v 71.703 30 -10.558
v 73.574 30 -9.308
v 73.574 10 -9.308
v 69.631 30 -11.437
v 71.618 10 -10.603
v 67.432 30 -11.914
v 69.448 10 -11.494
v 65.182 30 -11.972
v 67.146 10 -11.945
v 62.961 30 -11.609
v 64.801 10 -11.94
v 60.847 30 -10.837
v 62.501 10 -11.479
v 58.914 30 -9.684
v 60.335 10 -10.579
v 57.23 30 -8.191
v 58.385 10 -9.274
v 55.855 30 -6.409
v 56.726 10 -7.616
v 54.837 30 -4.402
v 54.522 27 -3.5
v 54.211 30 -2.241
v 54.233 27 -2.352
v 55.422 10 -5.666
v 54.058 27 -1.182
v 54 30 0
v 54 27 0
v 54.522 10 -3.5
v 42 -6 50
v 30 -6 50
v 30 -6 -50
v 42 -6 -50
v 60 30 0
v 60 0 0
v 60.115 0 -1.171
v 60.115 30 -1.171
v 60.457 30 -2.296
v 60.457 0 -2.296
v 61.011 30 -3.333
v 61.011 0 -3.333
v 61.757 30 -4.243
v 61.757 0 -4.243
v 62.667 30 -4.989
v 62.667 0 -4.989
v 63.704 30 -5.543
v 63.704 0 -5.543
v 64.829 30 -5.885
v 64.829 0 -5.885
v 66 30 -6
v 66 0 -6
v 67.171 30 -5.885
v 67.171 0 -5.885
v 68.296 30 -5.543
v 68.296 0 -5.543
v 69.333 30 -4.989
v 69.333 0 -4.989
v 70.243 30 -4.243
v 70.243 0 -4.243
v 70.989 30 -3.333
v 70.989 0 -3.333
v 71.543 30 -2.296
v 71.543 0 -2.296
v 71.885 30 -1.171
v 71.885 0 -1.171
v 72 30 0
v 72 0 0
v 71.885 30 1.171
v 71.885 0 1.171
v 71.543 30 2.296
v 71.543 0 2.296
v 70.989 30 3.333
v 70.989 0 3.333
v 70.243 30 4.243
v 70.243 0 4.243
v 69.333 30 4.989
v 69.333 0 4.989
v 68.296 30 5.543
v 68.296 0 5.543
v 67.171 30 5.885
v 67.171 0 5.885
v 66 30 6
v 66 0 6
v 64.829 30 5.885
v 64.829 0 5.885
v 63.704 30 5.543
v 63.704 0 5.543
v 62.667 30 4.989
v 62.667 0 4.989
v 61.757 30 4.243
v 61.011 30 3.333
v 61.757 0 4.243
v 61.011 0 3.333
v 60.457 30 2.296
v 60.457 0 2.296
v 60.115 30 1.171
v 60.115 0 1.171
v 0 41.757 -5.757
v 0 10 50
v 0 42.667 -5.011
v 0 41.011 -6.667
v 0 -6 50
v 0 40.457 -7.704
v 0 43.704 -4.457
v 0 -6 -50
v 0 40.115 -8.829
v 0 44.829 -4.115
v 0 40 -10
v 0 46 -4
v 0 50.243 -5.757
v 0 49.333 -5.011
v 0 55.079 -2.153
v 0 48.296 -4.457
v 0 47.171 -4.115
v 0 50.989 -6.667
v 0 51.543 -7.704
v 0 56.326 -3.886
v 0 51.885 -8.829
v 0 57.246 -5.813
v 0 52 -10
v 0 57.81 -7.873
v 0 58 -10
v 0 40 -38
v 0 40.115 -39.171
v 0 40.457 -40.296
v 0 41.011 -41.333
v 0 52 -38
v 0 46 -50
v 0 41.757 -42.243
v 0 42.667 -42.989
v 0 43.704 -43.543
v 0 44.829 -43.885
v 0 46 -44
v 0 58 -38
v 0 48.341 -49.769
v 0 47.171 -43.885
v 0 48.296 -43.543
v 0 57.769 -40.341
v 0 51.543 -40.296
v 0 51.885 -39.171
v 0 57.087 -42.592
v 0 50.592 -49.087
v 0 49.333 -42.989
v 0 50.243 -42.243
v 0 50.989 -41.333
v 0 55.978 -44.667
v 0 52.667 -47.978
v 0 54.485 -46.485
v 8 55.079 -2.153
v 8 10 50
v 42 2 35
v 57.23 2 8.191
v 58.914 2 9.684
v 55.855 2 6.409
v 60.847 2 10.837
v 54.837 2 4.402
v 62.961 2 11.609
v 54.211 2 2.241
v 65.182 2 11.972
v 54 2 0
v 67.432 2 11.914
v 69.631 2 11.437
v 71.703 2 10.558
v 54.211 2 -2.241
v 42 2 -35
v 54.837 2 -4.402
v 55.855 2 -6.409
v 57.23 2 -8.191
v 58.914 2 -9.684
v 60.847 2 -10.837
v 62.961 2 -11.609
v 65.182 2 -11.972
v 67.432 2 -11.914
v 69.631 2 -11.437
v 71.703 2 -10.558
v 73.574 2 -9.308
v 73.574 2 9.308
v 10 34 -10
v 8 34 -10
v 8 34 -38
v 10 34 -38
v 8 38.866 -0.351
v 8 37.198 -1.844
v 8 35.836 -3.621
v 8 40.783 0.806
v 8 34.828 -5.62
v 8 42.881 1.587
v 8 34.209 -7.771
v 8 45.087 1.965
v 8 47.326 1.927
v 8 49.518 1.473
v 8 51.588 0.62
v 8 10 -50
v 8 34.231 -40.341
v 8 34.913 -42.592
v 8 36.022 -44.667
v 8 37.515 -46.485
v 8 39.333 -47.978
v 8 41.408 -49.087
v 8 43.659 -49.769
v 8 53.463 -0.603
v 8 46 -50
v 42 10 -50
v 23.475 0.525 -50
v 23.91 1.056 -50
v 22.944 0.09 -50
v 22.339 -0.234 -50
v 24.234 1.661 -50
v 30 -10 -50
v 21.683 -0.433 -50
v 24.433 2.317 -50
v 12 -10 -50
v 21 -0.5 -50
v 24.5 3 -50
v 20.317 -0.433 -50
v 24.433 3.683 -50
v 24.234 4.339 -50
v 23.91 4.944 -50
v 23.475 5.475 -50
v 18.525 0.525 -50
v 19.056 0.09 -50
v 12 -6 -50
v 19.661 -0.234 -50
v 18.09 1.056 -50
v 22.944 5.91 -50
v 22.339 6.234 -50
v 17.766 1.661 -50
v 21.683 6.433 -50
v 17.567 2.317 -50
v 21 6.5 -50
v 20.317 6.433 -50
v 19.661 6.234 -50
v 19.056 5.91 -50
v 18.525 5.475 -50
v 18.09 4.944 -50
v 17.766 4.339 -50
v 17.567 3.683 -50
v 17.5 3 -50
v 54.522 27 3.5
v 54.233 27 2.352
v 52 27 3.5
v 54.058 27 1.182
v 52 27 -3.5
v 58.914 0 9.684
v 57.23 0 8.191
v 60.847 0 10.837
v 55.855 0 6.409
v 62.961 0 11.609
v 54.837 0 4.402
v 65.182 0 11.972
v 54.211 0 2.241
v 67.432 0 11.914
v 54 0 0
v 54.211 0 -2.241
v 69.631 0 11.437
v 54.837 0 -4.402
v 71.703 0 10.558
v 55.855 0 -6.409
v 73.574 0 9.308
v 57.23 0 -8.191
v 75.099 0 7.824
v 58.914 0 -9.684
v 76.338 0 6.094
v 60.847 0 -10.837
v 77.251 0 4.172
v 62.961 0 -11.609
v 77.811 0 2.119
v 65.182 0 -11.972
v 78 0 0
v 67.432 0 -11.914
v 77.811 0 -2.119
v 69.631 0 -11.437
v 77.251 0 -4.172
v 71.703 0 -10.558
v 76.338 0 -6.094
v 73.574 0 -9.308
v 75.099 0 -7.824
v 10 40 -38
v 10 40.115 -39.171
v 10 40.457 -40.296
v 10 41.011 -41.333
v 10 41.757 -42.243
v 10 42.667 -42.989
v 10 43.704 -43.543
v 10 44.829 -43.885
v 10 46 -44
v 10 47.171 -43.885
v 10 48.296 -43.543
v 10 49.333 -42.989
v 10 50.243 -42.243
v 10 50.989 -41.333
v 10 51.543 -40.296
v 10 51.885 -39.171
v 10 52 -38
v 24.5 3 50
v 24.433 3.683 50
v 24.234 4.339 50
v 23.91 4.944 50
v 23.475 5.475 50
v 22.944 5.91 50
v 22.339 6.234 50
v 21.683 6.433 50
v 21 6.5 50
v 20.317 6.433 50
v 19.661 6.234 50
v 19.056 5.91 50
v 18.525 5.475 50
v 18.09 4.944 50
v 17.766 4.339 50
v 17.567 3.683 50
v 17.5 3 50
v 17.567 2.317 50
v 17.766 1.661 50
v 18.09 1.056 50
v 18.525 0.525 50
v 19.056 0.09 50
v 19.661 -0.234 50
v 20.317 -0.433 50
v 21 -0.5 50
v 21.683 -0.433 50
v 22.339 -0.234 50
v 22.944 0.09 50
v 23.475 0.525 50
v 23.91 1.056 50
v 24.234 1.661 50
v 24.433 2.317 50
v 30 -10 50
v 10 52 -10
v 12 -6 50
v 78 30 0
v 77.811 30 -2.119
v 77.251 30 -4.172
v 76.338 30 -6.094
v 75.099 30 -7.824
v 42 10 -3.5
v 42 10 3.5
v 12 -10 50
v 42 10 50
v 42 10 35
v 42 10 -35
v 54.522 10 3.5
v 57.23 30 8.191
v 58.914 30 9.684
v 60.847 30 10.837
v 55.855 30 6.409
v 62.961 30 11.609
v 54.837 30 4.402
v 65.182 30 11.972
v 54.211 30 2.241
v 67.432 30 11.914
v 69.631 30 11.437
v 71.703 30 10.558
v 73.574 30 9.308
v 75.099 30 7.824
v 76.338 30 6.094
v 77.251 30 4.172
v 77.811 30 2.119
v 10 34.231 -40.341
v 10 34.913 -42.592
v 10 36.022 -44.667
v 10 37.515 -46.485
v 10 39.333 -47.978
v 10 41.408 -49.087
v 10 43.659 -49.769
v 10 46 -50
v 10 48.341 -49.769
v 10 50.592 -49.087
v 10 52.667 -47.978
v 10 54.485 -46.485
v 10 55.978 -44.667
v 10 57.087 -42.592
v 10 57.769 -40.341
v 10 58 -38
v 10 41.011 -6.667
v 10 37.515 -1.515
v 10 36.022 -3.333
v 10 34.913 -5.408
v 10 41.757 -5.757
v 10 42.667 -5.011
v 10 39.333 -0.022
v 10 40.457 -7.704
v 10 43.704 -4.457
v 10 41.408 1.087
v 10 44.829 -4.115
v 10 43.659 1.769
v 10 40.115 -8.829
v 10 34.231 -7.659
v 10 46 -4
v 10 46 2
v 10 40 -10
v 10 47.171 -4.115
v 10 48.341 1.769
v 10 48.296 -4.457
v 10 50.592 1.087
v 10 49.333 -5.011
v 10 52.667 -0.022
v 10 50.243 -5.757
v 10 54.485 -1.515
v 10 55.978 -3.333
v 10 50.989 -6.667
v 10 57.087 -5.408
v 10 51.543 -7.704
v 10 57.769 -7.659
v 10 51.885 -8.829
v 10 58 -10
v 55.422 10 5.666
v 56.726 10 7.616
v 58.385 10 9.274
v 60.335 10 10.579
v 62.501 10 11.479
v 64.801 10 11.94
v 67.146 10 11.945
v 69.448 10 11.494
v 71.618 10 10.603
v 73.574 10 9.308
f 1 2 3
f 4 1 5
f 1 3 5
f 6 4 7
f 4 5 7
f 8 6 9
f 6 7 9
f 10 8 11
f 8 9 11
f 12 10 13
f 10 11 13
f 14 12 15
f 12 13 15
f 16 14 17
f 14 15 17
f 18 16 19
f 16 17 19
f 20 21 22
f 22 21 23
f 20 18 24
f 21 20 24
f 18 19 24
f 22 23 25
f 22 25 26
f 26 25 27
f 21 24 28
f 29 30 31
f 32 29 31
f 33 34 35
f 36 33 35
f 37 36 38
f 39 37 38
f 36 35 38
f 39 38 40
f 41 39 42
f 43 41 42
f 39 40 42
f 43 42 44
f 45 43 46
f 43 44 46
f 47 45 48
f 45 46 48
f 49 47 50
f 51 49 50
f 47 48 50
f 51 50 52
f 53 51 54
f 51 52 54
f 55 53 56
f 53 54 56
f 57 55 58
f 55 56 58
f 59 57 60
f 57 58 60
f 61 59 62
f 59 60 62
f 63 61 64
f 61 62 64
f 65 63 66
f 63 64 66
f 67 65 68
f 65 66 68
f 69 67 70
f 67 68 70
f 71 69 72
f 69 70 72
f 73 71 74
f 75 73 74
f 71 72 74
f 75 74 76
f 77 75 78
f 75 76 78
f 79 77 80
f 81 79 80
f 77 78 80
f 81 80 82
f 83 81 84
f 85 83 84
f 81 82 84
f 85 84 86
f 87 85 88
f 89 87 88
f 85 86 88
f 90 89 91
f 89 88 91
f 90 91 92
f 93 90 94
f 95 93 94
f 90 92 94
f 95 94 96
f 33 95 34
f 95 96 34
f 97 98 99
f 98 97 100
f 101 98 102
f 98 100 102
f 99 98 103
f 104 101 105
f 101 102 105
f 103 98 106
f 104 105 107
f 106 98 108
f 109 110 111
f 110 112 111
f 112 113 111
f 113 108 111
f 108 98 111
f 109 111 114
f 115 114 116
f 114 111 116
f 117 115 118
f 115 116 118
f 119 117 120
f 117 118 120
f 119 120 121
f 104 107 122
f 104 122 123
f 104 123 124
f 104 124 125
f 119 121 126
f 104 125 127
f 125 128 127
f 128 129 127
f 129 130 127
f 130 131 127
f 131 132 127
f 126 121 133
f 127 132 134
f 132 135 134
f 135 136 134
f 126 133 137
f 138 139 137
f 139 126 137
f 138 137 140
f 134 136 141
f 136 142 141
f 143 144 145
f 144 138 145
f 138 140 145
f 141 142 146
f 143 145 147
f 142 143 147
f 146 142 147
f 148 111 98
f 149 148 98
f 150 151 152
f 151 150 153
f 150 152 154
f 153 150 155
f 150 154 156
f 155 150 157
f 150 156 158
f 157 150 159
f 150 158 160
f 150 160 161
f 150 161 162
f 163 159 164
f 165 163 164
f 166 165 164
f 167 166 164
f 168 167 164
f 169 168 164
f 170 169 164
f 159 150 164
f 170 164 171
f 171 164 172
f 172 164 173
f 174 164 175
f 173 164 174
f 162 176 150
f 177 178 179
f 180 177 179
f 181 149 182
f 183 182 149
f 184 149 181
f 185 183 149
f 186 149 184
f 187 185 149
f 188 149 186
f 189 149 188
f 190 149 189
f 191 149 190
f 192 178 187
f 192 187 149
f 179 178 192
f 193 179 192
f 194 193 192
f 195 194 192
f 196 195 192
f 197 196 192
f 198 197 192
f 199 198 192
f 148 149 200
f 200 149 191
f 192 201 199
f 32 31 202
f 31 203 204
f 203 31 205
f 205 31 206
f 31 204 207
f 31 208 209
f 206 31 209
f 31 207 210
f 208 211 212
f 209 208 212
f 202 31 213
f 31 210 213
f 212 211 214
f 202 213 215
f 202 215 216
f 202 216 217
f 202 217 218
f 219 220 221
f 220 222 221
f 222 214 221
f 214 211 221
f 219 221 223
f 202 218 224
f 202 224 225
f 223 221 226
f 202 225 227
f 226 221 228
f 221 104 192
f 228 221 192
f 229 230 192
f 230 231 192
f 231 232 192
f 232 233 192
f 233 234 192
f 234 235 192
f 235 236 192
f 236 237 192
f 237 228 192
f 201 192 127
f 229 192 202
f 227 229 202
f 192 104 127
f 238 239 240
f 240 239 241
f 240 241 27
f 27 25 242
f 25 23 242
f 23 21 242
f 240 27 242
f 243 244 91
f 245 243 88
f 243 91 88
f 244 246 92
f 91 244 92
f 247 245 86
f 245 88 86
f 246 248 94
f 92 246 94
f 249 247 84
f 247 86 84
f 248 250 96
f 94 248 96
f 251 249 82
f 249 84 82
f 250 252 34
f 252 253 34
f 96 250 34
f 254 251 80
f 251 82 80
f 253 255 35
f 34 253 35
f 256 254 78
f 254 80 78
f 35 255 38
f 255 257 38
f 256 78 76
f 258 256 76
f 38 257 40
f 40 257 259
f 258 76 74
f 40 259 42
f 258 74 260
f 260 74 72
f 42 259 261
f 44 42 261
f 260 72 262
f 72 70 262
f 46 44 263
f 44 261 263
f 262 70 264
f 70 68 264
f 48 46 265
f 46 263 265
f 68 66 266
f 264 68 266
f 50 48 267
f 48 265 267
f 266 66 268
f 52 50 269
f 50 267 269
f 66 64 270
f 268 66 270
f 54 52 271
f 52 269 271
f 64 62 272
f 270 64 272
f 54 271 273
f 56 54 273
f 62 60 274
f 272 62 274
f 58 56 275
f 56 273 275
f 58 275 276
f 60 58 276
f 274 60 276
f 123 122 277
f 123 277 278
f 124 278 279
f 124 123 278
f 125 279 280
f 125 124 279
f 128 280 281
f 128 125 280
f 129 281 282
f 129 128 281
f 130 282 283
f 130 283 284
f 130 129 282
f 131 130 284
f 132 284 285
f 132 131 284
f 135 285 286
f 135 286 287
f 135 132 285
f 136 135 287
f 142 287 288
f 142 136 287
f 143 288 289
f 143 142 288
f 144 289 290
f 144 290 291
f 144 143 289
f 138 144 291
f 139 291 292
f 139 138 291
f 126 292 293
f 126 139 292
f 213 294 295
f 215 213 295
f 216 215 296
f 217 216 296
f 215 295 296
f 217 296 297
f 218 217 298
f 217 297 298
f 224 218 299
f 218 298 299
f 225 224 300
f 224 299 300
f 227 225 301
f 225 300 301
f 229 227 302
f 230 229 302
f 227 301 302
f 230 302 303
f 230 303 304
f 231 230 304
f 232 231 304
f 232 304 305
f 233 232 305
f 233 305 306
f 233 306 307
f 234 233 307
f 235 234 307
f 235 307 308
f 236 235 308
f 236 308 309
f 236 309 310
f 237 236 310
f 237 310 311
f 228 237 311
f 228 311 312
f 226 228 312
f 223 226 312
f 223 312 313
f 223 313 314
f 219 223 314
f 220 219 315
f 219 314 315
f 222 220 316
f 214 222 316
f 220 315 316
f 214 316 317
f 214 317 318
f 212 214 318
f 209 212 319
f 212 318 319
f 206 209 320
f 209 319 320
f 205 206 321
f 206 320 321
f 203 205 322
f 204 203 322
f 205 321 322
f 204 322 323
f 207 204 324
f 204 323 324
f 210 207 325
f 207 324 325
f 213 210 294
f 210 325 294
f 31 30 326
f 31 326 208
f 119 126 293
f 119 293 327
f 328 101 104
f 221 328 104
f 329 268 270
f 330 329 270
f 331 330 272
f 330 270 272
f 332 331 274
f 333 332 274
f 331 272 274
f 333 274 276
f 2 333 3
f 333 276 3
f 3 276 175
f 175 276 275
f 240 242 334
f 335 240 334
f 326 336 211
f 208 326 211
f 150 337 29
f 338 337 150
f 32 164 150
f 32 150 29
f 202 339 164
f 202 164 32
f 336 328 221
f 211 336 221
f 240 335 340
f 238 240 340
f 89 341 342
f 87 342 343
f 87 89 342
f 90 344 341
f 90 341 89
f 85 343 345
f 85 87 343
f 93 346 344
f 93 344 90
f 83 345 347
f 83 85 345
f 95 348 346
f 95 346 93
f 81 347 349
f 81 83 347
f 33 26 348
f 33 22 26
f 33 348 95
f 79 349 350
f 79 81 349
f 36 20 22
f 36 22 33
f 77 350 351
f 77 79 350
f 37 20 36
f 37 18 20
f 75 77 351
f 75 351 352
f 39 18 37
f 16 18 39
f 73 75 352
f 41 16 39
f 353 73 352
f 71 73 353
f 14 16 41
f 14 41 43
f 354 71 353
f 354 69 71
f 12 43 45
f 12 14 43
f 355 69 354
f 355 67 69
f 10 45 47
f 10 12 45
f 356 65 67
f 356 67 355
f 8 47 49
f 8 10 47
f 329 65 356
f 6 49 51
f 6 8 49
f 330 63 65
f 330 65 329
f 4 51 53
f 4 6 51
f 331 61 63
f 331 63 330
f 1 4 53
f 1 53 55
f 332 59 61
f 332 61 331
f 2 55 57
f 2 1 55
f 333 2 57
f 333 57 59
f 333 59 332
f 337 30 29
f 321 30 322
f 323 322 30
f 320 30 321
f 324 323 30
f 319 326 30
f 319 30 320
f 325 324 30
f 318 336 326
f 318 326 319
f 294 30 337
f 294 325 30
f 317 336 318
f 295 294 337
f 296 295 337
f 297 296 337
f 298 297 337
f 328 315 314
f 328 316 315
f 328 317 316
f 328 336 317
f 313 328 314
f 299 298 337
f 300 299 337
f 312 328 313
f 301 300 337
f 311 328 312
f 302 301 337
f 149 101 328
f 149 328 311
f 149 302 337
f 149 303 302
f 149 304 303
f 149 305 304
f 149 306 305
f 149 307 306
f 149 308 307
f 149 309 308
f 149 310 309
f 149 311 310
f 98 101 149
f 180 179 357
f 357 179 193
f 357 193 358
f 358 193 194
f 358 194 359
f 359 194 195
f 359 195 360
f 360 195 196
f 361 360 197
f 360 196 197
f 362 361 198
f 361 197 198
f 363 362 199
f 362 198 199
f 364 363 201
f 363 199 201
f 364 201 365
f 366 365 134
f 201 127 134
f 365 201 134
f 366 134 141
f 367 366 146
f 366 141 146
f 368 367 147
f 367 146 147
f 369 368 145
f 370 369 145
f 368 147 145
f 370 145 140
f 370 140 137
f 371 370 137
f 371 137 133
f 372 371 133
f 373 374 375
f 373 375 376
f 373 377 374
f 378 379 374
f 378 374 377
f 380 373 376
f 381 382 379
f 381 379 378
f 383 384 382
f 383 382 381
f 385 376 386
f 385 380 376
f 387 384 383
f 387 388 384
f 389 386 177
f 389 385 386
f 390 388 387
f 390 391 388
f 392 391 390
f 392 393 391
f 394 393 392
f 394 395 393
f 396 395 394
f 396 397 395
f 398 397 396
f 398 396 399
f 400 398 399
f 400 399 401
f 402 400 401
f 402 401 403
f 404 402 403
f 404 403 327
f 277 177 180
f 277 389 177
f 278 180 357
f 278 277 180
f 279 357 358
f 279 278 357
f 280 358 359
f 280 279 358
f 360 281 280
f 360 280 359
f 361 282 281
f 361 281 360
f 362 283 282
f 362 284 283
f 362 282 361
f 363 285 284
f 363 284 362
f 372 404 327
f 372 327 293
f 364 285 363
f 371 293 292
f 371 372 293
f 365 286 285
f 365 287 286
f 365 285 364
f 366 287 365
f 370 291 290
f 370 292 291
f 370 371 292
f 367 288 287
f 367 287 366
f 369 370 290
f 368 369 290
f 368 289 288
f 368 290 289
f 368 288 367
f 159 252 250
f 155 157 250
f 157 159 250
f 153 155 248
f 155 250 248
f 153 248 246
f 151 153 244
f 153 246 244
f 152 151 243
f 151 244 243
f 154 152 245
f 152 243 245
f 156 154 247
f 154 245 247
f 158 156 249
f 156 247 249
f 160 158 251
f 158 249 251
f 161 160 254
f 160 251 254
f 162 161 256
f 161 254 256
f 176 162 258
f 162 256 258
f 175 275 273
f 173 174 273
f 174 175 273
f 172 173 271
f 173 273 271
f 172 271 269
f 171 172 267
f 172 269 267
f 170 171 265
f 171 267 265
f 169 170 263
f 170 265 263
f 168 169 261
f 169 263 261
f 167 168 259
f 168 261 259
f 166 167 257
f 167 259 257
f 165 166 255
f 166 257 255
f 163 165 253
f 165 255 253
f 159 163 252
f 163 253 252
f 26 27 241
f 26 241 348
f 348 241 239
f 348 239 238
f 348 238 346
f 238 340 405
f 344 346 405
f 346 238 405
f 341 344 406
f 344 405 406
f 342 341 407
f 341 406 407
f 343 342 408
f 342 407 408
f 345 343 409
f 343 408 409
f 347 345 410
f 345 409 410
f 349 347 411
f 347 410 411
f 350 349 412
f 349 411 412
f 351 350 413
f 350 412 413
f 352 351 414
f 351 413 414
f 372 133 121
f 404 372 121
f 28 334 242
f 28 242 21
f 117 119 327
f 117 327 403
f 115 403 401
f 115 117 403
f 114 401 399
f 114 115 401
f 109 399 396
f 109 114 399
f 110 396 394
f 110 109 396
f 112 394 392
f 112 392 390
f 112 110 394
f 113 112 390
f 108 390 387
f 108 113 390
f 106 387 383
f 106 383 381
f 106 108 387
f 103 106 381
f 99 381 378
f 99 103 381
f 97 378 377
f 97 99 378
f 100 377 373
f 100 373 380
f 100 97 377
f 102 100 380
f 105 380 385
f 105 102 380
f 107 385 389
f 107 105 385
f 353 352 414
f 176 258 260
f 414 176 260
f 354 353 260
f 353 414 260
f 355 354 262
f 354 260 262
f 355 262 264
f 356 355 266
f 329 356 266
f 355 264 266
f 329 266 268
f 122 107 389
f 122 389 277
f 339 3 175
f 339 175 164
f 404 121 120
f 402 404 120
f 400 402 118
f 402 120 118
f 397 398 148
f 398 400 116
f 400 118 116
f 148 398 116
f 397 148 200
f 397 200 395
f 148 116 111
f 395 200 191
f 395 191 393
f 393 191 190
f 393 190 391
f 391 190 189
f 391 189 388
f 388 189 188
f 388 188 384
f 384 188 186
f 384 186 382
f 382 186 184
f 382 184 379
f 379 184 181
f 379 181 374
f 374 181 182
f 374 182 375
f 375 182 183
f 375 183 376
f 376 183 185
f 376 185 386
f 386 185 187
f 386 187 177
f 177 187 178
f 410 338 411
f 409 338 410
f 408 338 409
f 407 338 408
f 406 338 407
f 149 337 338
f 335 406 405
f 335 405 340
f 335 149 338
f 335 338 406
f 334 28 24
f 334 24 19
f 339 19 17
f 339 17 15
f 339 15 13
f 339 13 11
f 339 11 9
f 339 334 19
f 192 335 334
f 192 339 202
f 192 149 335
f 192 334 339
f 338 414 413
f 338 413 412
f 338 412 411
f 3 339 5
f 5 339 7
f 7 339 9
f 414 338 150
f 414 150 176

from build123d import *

# Parameters (mm, degrees)
EXTRUDE_1_DEPTH      = 8
EXTRUDE_2_DEPTH      = 10
SKETCH_1_5_W         = 100
SKETCH_1_5_H         = 16
EXTRUDE_3_DEPTH      = 42
EXTRUDE_START        = 12
SKETCH_1_6_W         = 100
SKETCH_1_6_H         = 4
EXTRUDE_4_DEPTH      = 18
SKETCH_2_R           = 3.5
CUT_EXTRUDE_4_DEPTH  = 123.995934892
EXTRUDE_7_DEPTH      = 8
EXTRUDE_8_DEPTH      = 20
EXTRUDE_8_DEPTH_BACK = 10
RIB_START            = -3.5
RIB_2_DEPTH          = 7


# Read off the part's stored shape, not the designer's step: 筋2
with BuildPart() as part:
    # 草图1 → 凸台-拉伸1 (new body)
    with BuildSketch(Plane(origin=(0, 0, 0), x_dir=(0, 0, -1), z_dir=(1, 0, 0))):
        with BuildLine():
            Line((2.152816021, 55.078639964), (-50, 10))
            Line((-50, 10), (50, 10))
            Line((50, 10), (50, 46))
            ThreePointArc((50, 46), (46.485281374, 37.514718626), (38, 34))
            Line((38, 34), (10, 34))
            ThreePointArc((10, 34), (-1.245969935, 41.813335431), (2.152816021, 55.078639964))
        make_face()
    extrude(amount=EXTRUDE_1_DEPTH)

    # 草图1<3> → 凸台-拉伸2 (add)
    with BuildSketch(Plane(origin=(0, 0, 0), x_dir=(0, 0, -1), z_dir=(1, 0, 0))):
        with BuildLine():
            ThreePointArc((38, 34), (50, 46), (38, 58))
            Line((38, 58), (10, 58))
            ThreePointArc((10, 58), (-2, 46), (10, 34))
            Line((10, 34), (38, 34))
        make_face()
        with BuildLine():
            ThreePointArc((38, 40), (44, 46), (38, 52))
            Line((38, 52), (10, 52))
            ThreePointArc((10, 52), (4, 46), (10, 40))
            Line((10, 40), (38, 40))
        make_face(mode=Mode.SUBTRACT)
    extrude(amount=EXTRUDE_2_DEPTH)

    # 草图1<5> → 凸台-拉伸3 (add)
    with BuildSketch(Plane(origin=(0, 0, 0), x_dir=(0, 0, -1), z_dir=(1, 0, 0))):
        with Locations((0, 2)):
            Rectangle(SKETCH_1_5_W, SKETCH_1_5_H)
    extrude(amount=EXTRUDE_3_DEPTH)

    # 草图1<6> → 凸台-拉伸4 (add)
    with BuildSketch(Plane(origin=(0, 0, 0), x_dir=(0, 0, -1), z_dir=(1, 0, 0)).offset(EXTRUDE_START)):
        with Locations((0, -8)):
            Rectangle(SKETCH_1_6_W, SKETCH_1_6_H)
    extrude(amount=EXTRUDE_4_DEPTH)

    # 草图2 → 切除-拉伸4 (cut, through all)
    with BuildSketch(Plane.XY.offset(50)):
        with Locations((21, 3)):
            Circle(SKETCH_2_R)
    extrude(amount=-CUT_EXTRUDE_4_DEPTH, mode=Mode.SUBTRACT)

    # 草图4 → 凸台-拉伸7 (add)
    with BuildSketch(Plane(origin=(0, 10, 0), x_dir=(1, 0, 0), z_dir=(0, 1, 0))):
        with BuildLine():
            ThreePointArc((54, 0), (60.846702456, 10.837136357), (73.573920737, 9.307831362))
            Line((73.573920737, 9.307831362), (42, 35))
            Line((42, 35), (42, 0))
            Line((42, 0), (54, 0))
        make_face()
        with BuildLine():
            Line((42, -35), (73.573920737, -9.307831362))
            ThreePointArc((73.573920737, -9.307831362), (60.846702456, -10.837136357), (54, 0))
            Line((54, 0), (42, 0))
            Line((42, 0), (42, -35))
        make_face()
    extrude(amount=-EXTRUDE_7_DEPTH)

    # 草图4<3> → 凸台-拉伸8 (add, two sides: drawn at the far end of the back side and taken through both)
    with BuildSketch(Plane(origin=(0, 10, 0), x_dir=(1, 0, 0), z_dir=(0, 1, 0)).offset(-EXTRUDE_8_DEPTH_BACK)):
        with BuildLine():
            ThreePointArc((60, 0), (66, 6), (72, 0))
            Line((72, 0), (78, 0))
            ThreePointArc((78, 0), (76.837136357, 5.153297544), (73.573920737, 9.307831362))
            ThreePointArc((73.573920737, 9.307831362), (60.846702456, 10.837136357), (54, 0))
            Line((54, 0), (60, 0))
        make_face()
        with BuildLine():
            Line((78, 0), (72, 0))
            ThreePointArc((72, 0), (66, -6), (60, 0))
            Line((60, 0), (54, 0))
            ThreePointArc((54, 0), (60.846702456, -10.837136357), (73.573920737, -9.307831362))
            ThreePointArc((73.573920737, -9.307831362), (76.837136357, -5.153297544), (78, 0))
        make_face()
    extrude(amount=EXTRUDE_8_DEPTH + EXTRUDE_8_DEPTH_BACK)

    # 筋2 outline → 筋2 (add)
    with BuildSketch(Plane.XY.offset(RIB_START)):
        Polygon((56, 27), (52, 27), (42, 10), (56, 10), align=None)
    extrude(amount=RIB_2_DEPTH)


solid = part.part
